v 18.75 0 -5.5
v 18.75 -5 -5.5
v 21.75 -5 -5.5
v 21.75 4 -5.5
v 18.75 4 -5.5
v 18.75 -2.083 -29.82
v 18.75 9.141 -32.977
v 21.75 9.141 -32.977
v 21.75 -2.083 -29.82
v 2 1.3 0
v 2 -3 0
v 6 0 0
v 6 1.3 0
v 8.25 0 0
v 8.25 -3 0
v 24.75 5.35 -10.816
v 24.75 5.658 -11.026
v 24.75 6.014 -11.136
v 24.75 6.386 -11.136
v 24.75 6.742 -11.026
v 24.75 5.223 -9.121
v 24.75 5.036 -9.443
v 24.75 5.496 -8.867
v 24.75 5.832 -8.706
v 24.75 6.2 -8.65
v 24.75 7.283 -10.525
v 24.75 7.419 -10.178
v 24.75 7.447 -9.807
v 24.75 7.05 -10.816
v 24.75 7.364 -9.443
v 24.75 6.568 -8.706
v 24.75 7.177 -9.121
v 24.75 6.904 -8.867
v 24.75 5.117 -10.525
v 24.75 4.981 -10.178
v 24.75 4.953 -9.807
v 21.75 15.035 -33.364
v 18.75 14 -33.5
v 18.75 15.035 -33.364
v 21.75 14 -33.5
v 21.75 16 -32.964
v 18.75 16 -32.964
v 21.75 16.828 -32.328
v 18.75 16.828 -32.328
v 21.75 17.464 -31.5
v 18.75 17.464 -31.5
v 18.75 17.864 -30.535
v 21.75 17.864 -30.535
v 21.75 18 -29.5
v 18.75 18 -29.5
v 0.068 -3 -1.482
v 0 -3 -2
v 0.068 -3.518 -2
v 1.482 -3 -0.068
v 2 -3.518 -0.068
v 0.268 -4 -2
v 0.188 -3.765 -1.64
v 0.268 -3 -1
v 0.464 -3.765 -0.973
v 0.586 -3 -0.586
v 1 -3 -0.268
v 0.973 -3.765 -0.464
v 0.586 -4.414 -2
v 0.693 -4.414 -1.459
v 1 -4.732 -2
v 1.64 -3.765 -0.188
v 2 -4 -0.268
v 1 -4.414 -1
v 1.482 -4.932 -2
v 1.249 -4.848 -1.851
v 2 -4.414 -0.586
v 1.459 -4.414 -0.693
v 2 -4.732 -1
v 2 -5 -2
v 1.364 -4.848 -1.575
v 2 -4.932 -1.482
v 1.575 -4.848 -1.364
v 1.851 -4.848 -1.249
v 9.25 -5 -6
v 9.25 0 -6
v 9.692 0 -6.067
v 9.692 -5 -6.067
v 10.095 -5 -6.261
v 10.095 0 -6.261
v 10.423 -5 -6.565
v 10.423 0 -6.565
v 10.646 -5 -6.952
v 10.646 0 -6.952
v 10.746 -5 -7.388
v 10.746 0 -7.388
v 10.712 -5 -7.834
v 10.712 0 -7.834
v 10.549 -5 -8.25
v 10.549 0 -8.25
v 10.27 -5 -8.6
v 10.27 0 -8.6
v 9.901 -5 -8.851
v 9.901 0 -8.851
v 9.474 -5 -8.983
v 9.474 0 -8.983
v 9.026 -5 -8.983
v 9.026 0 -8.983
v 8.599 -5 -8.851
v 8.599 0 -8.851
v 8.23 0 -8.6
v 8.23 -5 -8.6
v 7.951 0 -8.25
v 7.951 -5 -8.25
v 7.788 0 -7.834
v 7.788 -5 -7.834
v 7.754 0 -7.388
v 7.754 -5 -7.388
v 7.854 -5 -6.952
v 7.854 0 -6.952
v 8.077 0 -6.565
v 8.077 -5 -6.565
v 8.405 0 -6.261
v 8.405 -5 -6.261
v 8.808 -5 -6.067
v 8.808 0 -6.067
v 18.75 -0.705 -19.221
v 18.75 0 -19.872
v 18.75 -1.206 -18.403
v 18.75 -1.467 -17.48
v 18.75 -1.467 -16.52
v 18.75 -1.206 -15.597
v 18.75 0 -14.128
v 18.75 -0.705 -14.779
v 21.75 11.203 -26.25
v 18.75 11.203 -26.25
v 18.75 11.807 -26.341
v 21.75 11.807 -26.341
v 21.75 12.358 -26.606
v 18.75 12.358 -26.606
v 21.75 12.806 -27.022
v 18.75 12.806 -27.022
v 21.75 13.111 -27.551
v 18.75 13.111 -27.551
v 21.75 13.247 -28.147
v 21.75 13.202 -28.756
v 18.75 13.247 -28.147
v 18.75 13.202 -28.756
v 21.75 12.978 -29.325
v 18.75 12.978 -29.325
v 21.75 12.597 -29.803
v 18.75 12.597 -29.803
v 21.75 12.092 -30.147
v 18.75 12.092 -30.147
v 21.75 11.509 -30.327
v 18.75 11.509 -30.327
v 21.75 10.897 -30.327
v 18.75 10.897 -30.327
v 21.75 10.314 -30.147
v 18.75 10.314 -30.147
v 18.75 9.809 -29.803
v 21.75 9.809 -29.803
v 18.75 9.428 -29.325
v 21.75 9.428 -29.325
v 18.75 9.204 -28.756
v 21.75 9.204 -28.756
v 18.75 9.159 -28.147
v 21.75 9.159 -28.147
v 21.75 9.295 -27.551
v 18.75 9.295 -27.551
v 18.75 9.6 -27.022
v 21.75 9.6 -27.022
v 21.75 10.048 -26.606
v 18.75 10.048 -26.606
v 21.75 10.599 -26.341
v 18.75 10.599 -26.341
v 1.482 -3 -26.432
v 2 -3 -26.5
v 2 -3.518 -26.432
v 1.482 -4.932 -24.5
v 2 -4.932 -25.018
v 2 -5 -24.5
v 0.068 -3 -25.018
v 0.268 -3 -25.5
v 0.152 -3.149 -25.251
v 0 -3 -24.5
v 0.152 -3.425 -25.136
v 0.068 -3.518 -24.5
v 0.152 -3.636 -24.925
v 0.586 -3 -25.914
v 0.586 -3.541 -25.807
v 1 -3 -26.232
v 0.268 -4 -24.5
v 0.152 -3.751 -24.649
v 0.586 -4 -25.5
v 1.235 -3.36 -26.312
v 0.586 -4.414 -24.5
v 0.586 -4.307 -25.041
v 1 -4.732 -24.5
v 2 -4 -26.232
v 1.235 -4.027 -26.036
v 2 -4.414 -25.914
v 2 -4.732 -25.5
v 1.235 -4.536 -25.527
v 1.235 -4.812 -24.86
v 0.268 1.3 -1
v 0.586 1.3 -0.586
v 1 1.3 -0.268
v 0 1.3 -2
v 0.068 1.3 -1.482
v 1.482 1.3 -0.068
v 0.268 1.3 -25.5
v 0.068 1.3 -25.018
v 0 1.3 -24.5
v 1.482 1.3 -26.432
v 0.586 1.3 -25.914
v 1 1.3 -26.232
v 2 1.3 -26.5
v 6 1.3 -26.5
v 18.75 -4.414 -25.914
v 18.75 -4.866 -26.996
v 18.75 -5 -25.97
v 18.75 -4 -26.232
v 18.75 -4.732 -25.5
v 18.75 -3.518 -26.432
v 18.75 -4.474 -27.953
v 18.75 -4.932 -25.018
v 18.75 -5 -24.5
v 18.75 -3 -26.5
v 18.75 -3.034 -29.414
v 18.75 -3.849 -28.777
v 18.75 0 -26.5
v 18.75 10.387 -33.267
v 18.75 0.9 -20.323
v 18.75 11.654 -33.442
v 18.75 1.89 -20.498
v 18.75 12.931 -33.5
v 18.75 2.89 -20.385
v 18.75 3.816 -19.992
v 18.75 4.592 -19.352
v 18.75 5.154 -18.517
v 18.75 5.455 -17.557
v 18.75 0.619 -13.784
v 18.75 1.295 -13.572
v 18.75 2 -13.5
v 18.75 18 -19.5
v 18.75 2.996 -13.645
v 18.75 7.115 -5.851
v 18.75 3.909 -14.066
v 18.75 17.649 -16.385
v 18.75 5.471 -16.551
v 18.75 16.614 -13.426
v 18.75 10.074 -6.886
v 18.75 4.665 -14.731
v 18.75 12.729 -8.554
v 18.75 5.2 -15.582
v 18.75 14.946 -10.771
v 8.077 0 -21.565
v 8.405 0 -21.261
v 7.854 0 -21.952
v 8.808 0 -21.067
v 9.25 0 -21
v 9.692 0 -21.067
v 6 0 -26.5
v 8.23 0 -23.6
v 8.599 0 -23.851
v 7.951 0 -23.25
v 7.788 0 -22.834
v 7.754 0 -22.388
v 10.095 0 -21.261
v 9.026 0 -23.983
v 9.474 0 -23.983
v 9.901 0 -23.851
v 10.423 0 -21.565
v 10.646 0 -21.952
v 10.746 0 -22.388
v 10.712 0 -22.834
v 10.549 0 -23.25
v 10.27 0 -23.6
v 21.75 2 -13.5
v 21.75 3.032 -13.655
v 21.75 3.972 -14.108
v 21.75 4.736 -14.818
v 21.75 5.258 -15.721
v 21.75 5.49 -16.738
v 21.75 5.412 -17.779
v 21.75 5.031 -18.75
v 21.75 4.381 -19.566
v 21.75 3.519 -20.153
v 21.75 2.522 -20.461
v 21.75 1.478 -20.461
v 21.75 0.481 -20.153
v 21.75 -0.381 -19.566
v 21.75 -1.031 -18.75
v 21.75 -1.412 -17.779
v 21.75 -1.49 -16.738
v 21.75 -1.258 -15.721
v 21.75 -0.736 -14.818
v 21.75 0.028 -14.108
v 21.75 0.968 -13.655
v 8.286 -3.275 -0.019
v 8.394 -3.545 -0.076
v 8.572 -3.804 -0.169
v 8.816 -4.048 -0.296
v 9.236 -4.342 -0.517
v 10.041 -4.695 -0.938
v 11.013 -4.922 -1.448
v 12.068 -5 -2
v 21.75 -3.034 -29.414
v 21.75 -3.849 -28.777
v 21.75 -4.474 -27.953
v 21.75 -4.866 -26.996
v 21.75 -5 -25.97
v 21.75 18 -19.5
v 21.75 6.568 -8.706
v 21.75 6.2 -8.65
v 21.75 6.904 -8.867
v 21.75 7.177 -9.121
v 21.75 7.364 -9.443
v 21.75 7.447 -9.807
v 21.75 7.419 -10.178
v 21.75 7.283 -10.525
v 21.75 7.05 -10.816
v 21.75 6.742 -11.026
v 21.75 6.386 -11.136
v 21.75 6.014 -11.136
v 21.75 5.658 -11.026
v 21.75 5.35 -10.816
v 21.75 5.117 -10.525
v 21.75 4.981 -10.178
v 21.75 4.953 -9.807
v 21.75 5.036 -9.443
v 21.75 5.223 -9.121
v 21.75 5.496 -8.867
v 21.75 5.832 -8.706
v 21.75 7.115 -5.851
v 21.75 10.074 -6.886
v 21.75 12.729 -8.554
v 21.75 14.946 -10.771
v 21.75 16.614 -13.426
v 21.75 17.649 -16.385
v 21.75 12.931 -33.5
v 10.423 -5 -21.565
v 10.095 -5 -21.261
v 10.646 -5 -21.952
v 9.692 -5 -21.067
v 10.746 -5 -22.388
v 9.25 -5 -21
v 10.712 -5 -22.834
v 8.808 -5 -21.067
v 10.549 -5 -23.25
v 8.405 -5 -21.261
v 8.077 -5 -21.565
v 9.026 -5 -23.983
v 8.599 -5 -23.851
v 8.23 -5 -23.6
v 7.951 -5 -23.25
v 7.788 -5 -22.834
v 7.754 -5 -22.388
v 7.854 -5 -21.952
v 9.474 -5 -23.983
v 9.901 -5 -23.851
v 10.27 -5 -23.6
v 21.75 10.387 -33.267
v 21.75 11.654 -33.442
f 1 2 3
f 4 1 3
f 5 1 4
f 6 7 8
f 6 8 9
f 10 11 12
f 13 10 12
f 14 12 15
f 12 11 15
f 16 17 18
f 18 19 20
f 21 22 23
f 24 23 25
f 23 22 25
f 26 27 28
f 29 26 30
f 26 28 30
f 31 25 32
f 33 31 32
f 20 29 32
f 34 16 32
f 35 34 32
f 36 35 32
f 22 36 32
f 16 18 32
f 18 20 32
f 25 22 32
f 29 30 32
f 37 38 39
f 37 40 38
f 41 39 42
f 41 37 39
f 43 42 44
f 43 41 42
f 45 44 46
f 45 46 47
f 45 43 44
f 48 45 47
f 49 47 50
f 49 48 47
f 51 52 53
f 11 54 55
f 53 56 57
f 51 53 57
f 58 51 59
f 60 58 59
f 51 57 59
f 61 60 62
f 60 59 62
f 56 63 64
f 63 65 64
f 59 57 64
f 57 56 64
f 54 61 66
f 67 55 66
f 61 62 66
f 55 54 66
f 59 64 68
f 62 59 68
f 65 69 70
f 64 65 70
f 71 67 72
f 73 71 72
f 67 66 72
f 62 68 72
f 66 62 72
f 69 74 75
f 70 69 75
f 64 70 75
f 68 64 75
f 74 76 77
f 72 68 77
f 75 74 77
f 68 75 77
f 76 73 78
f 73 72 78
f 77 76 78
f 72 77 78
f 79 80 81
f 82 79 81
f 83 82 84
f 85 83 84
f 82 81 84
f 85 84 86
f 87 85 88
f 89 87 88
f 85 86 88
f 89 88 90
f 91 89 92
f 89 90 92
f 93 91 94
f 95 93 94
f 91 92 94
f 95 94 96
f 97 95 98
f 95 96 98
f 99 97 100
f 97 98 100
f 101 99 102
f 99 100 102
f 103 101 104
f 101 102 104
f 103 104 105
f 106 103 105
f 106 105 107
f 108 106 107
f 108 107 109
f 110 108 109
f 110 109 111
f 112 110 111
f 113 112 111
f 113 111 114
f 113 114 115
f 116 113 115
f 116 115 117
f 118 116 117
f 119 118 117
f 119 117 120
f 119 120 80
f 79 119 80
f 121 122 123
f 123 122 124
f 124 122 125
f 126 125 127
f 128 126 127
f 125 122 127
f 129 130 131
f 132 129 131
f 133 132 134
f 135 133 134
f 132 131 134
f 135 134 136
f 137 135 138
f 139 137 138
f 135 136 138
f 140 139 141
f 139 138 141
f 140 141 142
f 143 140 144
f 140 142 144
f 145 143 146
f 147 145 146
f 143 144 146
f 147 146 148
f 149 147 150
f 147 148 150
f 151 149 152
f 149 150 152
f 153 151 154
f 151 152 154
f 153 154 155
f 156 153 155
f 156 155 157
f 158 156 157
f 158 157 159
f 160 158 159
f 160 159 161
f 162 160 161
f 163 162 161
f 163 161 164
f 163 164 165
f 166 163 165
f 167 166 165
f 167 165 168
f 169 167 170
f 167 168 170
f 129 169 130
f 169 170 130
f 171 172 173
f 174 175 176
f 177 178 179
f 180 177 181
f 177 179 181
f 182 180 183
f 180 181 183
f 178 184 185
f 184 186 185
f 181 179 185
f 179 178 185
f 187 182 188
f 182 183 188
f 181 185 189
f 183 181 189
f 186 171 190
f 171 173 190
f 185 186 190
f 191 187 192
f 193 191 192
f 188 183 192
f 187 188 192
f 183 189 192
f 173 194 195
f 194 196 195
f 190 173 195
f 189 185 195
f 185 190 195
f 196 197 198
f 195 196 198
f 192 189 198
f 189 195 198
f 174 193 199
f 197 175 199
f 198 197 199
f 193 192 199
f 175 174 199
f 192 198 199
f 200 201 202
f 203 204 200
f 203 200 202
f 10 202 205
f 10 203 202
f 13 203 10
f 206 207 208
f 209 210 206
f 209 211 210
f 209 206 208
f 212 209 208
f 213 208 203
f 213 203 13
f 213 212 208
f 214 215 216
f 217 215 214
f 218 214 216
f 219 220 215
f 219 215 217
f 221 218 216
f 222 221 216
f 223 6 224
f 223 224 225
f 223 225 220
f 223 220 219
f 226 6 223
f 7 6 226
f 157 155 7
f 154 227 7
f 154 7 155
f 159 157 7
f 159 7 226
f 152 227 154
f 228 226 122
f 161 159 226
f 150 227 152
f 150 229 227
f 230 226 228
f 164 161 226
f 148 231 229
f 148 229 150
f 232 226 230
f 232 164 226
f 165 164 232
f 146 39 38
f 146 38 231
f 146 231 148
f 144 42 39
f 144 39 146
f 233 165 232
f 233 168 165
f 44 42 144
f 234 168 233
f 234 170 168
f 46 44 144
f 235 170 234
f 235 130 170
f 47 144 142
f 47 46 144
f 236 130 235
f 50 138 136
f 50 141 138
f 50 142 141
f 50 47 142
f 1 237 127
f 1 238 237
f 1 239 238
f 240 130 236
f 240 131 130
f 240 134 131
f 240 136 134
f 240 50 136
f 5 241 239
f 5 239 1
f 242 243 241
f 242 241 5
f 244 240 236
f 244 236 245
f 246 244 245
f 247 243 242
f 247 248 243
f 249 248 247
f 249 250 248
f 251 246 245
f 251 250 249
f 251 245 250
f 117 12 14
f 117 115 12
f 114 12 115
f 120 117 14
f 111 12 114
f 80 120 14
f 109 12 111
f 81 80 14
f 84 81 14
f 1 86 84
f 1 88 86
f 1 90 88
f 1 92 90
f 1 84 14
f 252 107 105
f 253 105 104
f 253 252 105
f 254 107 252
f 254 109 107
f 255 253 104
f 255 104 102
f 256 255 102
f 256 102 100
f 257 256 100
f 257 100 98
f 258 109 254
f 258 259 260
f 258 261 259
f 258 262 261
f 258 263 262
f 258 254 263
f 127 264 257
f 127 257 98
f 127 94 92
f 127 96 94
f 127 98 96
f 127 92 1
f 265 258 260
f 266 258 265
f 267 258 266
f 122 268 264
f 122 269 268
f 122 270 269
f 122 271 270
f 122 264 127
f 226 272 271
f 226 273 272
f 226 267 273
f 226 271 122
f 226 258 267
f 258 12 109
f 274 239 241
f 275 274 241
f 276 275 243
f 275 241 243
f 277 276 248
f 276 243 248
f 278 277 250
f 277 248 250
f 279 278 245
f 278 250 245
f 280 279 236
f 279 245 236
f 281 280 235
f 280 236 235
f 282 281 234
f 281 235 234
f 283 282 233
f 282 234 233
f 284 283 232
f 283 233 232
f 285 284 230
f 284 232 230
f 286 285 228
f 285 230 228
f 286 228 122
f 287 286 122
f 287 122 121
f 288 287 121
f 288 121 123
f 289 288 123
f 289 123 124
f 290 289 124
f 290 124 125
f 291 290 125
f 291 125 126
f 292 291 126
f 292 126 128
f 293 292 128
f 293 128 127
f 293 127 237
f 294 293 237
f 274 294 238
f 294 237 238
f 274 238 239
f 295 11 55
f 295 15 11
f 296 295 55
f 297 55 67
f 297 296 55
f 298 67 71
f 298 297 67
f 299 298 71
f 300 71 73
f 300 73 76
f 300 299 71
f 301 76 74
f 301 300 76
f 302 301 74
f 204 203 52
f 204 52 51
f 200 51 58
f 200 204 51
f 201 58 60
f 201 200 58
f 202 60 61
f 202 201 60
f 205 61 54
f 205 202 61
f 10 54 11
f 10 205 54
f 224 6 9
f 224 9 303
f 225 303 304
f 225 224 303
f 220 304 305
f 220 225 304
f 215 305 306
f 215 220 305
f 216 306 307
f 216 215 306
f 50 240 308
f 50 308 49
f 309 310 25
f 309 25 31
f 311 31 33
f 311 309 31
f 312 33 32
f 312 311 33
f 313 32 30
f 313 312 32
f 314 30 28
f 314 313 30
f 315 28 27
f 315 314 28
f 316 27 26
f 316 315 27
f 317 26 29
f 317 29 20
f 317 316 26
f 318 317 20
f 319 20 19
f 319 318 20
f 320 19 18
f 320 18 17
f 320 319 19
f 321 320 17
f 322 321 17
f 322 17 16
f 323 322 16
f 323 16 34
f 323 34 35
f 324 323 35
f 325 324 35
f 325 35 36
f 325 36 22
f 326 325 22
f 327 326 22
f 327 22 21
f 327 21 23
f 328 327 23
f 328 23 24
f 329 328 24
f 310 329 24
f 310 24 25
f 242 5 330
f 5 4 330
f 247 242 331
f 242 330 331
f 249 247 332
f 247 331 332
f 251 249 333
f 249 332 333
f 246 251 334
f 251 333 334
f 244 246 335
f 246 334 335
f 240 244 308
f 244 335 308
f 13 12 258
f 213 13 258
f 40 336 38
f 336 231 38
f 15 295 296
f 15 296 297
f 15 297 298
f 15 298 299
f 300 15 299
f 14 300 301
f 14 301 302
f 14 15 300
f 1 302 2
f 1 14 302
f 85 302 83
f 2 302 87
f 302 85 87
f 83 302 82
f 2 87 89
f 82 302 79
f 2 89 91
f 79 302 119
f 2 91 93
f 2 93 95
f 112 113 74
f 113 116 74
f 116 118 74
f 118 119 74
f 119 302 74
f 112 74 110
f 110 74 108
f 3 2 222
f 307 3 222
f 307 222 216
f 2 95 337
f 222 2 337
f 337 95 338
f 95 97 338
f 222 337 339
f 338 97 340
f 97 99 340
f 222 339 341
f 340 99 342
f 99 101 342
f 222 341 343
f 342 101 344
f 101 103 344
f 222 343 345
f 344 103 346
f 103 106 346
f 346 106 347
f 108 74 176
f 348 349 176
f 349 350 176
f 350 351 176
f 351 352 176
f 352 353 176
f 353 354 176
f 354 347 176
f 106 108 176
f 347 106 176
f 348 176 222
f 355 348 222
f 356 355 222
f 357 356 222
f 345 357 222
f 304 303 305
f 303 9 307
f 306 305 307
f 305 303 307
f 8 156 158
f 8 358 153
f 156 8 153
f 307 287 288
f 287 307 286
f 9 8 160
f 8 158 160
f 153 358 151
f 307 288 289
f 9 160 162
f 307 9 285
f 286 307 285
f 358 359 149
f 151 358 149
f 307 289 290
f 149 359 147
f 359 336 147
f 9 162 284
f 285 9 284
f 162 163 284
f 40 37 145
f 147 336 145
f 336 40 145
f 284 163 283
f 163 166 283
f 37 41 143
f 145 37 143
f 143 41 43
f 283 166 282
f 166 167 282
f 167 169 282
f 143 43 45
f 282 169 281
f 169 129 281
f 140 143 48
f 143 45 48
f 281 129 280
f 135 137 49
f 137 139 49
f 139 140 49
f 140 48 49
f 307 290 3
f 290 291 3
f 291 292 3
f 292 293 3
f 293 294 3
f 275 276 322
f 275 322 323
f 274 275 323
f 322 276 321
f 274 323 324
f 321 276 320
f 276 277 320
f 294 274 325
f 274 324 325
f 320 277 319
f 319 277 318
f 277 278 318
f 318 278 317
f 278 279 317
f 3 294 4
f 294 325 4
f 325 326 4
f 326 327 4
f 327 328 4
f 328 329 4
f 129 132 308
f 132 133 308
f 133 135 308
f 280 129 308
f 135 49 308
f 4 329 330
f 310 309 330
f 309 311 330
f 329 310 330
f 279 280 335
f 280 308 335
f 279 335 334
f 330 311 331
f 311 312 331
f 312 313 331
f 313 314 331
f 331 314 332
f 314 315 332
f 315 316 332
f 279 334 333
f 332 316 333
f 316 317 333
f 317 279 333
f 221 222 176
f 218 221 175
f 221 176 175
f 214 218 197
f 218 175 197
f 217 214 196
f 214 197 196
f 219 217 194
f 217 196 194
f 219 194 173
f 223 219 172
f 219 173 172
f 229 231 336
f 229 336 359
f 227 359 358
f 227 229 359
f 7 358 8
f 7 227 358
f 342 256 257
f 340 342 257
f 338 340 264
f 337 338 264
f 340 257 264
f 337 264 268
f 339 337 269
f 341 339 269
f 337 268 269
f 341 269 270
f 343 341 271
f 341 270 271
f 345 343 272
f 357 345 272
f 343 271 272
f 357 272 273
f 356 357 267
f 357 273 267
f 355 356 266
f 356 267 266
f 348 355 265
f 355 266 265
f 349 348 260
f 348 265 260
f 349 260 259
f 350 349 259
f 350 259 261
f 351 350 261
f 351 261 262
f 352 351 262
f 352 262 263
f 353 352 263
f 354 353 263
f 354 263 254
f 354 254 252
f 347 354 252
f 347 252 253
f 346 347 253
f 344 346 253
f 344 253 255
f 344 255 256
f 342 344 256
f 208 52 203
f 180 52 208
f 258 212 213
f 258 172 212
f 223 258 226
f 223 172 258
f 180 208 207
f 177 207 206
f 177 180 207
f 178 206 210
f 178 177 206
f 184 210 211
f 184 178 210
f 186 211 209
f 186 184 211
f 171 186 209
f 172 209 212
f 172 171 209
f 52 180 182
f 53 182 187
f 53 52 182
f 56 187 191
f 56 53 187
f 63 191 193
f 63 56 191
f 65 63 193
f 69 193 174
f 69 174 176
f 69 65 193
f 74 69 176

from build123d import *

# Parameters (mm, degrees)
EXTRUDE_1_DEPTH     = 5
SKETCH_2_W          = 28
SKETCH_2_H          = 23
EXTRUDE_2_DEPTH     = 3
SKETCH_3_R          = 1.5
CUT_EXTRUDE_1_DEPTH = 44.809958913
SKETCH_4_R          = 3.5
SKETCH_4_R_2        = 1.25
CUT_EXTRUDE_2_DEPTH = 43.400619099
FILLET_3_R          = 14
FILLET_4_R          = 2
SKETCH_6_W          = 6
SKETCH_6_H          = 26.5
EXTRUDE_3_DEPTH     = 1.3
FILLET_5_R          = 2
FILLET_6_R          = 2
SKETCH_7_R          = 1.25
EXTRUDE_4_DEPTH     = 6
SKETCH_8_W          = 11
SKETCH_8_H          = 3.2
EXTRUDE_5_DEPTH     = 3
SKETCH_10_R         = 2.05
CUT_EXTRUDE_3_DEPTH = 3
CUT_EXTRUDE_4_DEPTH = 3
FILLET_7_R          = 1
FILLET_8_R          = 2
FILLET_9_R          = 2
CUT_EXTRUDE_5_DEPTH = 10
FILLET_10_R         = 4


with BuildPart() as part:
    # 草图1 → 凸台-拉伸1 (new body)
    with BuildSketch(Plane(origin=(0, 0, 0), x_dir=(1, 0, 0), z_dir=(0, 1, 0))):
        Polygon((0, 0), (8.25, 0), (18.75, 5.5), (18.75, 26.5), (0, 26.5), align=None)
    extrude(amount=-EXTRUDE_1_DEPTH)

    # 草图2 → 凸台-拉伸2 (add)
    with BuildSketch(Plane(origin=(18.75, 0, 0), x_dir=(0, 0, -1), z_dir=(1, 0, 0))):
        with Locations((19.5, 6.5)):
            Rectangle(SKETCH_2_W, SKETCH_2_H)
    extrude(amount=EXTRUDE_2_DEPTH)

    # 草图3 → 切除-拉伸1 (cut, through all)
    with BuildSketch(Plane(origin=(0, 0, 0), x_dir=(1, 0, 0), z_dir=(0, 1, 0))):
        with Locations(Location((9.25, 22.5, 0), (0, 0, 270))):
            Circle(SKETCH_3_R)
        with Locations(Location((9.25, 7.5, 0), (0, 0, 270))):
            Circle(SKETCH_3_R)
    extrude(amount=-CUT_EXTRUDE_1_DEPTH, mode=Mode.SUBTRACT)

    # 草图4 → 切除-拉伸2 (cut, through all)
    with BuildSketch(Plane.ZY.offset(-18.75)):
        with Locations((-17, 2)):
            Circle(SKETCH_4_R)
        with Locations((-9.9, 6.2)):
            Circle(SKETCH_4_R_2)
    extrude(amount=-CUT_EXTRUDE_2_DEPTH, mode=Mode.SUBTRACT)

    # 圆角3
    fillet_3_edges = [part.edges().sort_by_distance(p)[0] for p in [
        (20.25, 18, -5.5),
    ]]
    fillet(fillet_3_edges, radius=FILLET_3_R)

    # 圆角4
    fillet_4_edges = [part.edges().sort_by_distance(p)[0] for p in [
        (9.375, -5, -26.5),
    ]]
    fillet(fillet_4_edges, radius=FILLET_4_R)

    # 草图6 → 凸台-拉伸3 (add)
    with BuildSketch(Plane(origin=(0, 0, 0), x_dir=(1, 0, 0), z_dir=(0, 1, 0))):
        with Locations((3, 13.25)):
            Rectangle(SKETCH_6_W, SKETCH_6_H)
    extrude(amount=EXTRUDE_3_DEPTH)

    # 圆角5
    fillet_5_edges = [part.edges().sort_by_distance(p)[0] for p in [
        (0, -1.85, 0),
    ]]
    fillet(fillet_5_edges, radius=FILLET_5_R)

    # 圆角6
    fillet_6_edges = [part.edges().sort_by_distance(p)[0] for p in [
        (0, -0.85, -26.5),
        (0, -5, -13.25),
        (0, -4.414213562, -25.914213562),
        (5.125, -5, 0),
        (0.585786438, -5, -0.585786438),
    ]]
    fillet(fillet_6_edges, radius=FILLET_6_R)

    # 草图7 → 凸台-拉伸4 (add)
    with BuildSketch(Plane.ZY.offset(-18.75)):
        with Locations((-9.9, 6.2)):
            Circle(SKETCH_7_R)
    extrude(amount=-EXTRUDE_4_DEPTH)

    # 草图8 → 凸台-拉伸5 (add)
    with BuildSketch(Plane.ZY.offset(-18.75)):
        with Locations((-28, 19.6)):
            Rectangle(SKETCH_8_W, SKETCH_8_H)
    extrude(amount=-EXTRUDE_5_DEPTH)

    # 草图10 → 切除-拉伸3 (cut)
    with BuildSketch(Plane.ZY.offset(-18.75)):
        with Locations((-28.3, 11.203029343)):
            Circle(SKETCH_10_R)
    extrude(amount=-CUT_EXTRUDE_3_DEPTH, mode=Mode.SUBTRACT)

    # 草图11 → 切除-拉伸4 (cut)
    with BuildSketch(Plane.ZY.offset(-18.75)):
        with BuildLine():
            Line((-32.977113162, 9.140846799), (-29.820411226, -2.082982308))
            ThreePointArc((-29.820411226, -2.082982308), (-28.385182257, -4.188410986), (-25.969807465, -5))
            Line((-25.969807465, -5), (-33.5, -5))
            Line((-33.5, -5), (-33.5, 12.931284876))
            ThreePointArc((-33.5, 12.931284876), (-33.368662233, 11.018117903), (-32.977113162, 9.140846799))
        make_face()
    extrude(amount=-CUT_EXTRUDE_4_DEPTH, mode=Mode.SUBTRACT)

    # 圆角7
    fillet_7_edges = [part.edges().sort_by_distance(p)[0] for p in [
        (20.25, 18, -22.5),
    ]]
    fillet(fillet_7_edges, radius=FILLET_7_R)

    # 圆角8
    fillet_8_edges = [part.edges().sort_by_distance(p)[0] for p in [
        (20.25, 21.2, -22.5),
    ]]
    fillet(fillet_8_edges, radius=FILLET_8_R)

    # 圆角9
    fillet_9_edges = [part.edges().sort_by_distance(p)[0] for p in [
        (20.25, 21.2, -33.5),
    ]]
    fillet(fillet_9_edges, radius=FILLET_9_R)

    # 草图12 → 切除-拉伸5 (cut)
    with BuildSketch(Plane.ZY.offset(-18.75)):
        Polygon((-21.5, 18), (-33.5, 18), (-36.951224722, 21.933704181), (-20.790244944, 21.933704181), align=None)
    extrude(amount=-CUT_EXTRUDE_5_DEPTH, mode=Mode.SUBTRACT)

    # 圆角10
    fillet_10_edges = [part.edges().sort_by_distance(p)[0] for p in [
        (20.25, 18, -33.5),
    ]]
    fillet(fillet_10_edges, radius=FILLET_10_R)


solid = part.part
